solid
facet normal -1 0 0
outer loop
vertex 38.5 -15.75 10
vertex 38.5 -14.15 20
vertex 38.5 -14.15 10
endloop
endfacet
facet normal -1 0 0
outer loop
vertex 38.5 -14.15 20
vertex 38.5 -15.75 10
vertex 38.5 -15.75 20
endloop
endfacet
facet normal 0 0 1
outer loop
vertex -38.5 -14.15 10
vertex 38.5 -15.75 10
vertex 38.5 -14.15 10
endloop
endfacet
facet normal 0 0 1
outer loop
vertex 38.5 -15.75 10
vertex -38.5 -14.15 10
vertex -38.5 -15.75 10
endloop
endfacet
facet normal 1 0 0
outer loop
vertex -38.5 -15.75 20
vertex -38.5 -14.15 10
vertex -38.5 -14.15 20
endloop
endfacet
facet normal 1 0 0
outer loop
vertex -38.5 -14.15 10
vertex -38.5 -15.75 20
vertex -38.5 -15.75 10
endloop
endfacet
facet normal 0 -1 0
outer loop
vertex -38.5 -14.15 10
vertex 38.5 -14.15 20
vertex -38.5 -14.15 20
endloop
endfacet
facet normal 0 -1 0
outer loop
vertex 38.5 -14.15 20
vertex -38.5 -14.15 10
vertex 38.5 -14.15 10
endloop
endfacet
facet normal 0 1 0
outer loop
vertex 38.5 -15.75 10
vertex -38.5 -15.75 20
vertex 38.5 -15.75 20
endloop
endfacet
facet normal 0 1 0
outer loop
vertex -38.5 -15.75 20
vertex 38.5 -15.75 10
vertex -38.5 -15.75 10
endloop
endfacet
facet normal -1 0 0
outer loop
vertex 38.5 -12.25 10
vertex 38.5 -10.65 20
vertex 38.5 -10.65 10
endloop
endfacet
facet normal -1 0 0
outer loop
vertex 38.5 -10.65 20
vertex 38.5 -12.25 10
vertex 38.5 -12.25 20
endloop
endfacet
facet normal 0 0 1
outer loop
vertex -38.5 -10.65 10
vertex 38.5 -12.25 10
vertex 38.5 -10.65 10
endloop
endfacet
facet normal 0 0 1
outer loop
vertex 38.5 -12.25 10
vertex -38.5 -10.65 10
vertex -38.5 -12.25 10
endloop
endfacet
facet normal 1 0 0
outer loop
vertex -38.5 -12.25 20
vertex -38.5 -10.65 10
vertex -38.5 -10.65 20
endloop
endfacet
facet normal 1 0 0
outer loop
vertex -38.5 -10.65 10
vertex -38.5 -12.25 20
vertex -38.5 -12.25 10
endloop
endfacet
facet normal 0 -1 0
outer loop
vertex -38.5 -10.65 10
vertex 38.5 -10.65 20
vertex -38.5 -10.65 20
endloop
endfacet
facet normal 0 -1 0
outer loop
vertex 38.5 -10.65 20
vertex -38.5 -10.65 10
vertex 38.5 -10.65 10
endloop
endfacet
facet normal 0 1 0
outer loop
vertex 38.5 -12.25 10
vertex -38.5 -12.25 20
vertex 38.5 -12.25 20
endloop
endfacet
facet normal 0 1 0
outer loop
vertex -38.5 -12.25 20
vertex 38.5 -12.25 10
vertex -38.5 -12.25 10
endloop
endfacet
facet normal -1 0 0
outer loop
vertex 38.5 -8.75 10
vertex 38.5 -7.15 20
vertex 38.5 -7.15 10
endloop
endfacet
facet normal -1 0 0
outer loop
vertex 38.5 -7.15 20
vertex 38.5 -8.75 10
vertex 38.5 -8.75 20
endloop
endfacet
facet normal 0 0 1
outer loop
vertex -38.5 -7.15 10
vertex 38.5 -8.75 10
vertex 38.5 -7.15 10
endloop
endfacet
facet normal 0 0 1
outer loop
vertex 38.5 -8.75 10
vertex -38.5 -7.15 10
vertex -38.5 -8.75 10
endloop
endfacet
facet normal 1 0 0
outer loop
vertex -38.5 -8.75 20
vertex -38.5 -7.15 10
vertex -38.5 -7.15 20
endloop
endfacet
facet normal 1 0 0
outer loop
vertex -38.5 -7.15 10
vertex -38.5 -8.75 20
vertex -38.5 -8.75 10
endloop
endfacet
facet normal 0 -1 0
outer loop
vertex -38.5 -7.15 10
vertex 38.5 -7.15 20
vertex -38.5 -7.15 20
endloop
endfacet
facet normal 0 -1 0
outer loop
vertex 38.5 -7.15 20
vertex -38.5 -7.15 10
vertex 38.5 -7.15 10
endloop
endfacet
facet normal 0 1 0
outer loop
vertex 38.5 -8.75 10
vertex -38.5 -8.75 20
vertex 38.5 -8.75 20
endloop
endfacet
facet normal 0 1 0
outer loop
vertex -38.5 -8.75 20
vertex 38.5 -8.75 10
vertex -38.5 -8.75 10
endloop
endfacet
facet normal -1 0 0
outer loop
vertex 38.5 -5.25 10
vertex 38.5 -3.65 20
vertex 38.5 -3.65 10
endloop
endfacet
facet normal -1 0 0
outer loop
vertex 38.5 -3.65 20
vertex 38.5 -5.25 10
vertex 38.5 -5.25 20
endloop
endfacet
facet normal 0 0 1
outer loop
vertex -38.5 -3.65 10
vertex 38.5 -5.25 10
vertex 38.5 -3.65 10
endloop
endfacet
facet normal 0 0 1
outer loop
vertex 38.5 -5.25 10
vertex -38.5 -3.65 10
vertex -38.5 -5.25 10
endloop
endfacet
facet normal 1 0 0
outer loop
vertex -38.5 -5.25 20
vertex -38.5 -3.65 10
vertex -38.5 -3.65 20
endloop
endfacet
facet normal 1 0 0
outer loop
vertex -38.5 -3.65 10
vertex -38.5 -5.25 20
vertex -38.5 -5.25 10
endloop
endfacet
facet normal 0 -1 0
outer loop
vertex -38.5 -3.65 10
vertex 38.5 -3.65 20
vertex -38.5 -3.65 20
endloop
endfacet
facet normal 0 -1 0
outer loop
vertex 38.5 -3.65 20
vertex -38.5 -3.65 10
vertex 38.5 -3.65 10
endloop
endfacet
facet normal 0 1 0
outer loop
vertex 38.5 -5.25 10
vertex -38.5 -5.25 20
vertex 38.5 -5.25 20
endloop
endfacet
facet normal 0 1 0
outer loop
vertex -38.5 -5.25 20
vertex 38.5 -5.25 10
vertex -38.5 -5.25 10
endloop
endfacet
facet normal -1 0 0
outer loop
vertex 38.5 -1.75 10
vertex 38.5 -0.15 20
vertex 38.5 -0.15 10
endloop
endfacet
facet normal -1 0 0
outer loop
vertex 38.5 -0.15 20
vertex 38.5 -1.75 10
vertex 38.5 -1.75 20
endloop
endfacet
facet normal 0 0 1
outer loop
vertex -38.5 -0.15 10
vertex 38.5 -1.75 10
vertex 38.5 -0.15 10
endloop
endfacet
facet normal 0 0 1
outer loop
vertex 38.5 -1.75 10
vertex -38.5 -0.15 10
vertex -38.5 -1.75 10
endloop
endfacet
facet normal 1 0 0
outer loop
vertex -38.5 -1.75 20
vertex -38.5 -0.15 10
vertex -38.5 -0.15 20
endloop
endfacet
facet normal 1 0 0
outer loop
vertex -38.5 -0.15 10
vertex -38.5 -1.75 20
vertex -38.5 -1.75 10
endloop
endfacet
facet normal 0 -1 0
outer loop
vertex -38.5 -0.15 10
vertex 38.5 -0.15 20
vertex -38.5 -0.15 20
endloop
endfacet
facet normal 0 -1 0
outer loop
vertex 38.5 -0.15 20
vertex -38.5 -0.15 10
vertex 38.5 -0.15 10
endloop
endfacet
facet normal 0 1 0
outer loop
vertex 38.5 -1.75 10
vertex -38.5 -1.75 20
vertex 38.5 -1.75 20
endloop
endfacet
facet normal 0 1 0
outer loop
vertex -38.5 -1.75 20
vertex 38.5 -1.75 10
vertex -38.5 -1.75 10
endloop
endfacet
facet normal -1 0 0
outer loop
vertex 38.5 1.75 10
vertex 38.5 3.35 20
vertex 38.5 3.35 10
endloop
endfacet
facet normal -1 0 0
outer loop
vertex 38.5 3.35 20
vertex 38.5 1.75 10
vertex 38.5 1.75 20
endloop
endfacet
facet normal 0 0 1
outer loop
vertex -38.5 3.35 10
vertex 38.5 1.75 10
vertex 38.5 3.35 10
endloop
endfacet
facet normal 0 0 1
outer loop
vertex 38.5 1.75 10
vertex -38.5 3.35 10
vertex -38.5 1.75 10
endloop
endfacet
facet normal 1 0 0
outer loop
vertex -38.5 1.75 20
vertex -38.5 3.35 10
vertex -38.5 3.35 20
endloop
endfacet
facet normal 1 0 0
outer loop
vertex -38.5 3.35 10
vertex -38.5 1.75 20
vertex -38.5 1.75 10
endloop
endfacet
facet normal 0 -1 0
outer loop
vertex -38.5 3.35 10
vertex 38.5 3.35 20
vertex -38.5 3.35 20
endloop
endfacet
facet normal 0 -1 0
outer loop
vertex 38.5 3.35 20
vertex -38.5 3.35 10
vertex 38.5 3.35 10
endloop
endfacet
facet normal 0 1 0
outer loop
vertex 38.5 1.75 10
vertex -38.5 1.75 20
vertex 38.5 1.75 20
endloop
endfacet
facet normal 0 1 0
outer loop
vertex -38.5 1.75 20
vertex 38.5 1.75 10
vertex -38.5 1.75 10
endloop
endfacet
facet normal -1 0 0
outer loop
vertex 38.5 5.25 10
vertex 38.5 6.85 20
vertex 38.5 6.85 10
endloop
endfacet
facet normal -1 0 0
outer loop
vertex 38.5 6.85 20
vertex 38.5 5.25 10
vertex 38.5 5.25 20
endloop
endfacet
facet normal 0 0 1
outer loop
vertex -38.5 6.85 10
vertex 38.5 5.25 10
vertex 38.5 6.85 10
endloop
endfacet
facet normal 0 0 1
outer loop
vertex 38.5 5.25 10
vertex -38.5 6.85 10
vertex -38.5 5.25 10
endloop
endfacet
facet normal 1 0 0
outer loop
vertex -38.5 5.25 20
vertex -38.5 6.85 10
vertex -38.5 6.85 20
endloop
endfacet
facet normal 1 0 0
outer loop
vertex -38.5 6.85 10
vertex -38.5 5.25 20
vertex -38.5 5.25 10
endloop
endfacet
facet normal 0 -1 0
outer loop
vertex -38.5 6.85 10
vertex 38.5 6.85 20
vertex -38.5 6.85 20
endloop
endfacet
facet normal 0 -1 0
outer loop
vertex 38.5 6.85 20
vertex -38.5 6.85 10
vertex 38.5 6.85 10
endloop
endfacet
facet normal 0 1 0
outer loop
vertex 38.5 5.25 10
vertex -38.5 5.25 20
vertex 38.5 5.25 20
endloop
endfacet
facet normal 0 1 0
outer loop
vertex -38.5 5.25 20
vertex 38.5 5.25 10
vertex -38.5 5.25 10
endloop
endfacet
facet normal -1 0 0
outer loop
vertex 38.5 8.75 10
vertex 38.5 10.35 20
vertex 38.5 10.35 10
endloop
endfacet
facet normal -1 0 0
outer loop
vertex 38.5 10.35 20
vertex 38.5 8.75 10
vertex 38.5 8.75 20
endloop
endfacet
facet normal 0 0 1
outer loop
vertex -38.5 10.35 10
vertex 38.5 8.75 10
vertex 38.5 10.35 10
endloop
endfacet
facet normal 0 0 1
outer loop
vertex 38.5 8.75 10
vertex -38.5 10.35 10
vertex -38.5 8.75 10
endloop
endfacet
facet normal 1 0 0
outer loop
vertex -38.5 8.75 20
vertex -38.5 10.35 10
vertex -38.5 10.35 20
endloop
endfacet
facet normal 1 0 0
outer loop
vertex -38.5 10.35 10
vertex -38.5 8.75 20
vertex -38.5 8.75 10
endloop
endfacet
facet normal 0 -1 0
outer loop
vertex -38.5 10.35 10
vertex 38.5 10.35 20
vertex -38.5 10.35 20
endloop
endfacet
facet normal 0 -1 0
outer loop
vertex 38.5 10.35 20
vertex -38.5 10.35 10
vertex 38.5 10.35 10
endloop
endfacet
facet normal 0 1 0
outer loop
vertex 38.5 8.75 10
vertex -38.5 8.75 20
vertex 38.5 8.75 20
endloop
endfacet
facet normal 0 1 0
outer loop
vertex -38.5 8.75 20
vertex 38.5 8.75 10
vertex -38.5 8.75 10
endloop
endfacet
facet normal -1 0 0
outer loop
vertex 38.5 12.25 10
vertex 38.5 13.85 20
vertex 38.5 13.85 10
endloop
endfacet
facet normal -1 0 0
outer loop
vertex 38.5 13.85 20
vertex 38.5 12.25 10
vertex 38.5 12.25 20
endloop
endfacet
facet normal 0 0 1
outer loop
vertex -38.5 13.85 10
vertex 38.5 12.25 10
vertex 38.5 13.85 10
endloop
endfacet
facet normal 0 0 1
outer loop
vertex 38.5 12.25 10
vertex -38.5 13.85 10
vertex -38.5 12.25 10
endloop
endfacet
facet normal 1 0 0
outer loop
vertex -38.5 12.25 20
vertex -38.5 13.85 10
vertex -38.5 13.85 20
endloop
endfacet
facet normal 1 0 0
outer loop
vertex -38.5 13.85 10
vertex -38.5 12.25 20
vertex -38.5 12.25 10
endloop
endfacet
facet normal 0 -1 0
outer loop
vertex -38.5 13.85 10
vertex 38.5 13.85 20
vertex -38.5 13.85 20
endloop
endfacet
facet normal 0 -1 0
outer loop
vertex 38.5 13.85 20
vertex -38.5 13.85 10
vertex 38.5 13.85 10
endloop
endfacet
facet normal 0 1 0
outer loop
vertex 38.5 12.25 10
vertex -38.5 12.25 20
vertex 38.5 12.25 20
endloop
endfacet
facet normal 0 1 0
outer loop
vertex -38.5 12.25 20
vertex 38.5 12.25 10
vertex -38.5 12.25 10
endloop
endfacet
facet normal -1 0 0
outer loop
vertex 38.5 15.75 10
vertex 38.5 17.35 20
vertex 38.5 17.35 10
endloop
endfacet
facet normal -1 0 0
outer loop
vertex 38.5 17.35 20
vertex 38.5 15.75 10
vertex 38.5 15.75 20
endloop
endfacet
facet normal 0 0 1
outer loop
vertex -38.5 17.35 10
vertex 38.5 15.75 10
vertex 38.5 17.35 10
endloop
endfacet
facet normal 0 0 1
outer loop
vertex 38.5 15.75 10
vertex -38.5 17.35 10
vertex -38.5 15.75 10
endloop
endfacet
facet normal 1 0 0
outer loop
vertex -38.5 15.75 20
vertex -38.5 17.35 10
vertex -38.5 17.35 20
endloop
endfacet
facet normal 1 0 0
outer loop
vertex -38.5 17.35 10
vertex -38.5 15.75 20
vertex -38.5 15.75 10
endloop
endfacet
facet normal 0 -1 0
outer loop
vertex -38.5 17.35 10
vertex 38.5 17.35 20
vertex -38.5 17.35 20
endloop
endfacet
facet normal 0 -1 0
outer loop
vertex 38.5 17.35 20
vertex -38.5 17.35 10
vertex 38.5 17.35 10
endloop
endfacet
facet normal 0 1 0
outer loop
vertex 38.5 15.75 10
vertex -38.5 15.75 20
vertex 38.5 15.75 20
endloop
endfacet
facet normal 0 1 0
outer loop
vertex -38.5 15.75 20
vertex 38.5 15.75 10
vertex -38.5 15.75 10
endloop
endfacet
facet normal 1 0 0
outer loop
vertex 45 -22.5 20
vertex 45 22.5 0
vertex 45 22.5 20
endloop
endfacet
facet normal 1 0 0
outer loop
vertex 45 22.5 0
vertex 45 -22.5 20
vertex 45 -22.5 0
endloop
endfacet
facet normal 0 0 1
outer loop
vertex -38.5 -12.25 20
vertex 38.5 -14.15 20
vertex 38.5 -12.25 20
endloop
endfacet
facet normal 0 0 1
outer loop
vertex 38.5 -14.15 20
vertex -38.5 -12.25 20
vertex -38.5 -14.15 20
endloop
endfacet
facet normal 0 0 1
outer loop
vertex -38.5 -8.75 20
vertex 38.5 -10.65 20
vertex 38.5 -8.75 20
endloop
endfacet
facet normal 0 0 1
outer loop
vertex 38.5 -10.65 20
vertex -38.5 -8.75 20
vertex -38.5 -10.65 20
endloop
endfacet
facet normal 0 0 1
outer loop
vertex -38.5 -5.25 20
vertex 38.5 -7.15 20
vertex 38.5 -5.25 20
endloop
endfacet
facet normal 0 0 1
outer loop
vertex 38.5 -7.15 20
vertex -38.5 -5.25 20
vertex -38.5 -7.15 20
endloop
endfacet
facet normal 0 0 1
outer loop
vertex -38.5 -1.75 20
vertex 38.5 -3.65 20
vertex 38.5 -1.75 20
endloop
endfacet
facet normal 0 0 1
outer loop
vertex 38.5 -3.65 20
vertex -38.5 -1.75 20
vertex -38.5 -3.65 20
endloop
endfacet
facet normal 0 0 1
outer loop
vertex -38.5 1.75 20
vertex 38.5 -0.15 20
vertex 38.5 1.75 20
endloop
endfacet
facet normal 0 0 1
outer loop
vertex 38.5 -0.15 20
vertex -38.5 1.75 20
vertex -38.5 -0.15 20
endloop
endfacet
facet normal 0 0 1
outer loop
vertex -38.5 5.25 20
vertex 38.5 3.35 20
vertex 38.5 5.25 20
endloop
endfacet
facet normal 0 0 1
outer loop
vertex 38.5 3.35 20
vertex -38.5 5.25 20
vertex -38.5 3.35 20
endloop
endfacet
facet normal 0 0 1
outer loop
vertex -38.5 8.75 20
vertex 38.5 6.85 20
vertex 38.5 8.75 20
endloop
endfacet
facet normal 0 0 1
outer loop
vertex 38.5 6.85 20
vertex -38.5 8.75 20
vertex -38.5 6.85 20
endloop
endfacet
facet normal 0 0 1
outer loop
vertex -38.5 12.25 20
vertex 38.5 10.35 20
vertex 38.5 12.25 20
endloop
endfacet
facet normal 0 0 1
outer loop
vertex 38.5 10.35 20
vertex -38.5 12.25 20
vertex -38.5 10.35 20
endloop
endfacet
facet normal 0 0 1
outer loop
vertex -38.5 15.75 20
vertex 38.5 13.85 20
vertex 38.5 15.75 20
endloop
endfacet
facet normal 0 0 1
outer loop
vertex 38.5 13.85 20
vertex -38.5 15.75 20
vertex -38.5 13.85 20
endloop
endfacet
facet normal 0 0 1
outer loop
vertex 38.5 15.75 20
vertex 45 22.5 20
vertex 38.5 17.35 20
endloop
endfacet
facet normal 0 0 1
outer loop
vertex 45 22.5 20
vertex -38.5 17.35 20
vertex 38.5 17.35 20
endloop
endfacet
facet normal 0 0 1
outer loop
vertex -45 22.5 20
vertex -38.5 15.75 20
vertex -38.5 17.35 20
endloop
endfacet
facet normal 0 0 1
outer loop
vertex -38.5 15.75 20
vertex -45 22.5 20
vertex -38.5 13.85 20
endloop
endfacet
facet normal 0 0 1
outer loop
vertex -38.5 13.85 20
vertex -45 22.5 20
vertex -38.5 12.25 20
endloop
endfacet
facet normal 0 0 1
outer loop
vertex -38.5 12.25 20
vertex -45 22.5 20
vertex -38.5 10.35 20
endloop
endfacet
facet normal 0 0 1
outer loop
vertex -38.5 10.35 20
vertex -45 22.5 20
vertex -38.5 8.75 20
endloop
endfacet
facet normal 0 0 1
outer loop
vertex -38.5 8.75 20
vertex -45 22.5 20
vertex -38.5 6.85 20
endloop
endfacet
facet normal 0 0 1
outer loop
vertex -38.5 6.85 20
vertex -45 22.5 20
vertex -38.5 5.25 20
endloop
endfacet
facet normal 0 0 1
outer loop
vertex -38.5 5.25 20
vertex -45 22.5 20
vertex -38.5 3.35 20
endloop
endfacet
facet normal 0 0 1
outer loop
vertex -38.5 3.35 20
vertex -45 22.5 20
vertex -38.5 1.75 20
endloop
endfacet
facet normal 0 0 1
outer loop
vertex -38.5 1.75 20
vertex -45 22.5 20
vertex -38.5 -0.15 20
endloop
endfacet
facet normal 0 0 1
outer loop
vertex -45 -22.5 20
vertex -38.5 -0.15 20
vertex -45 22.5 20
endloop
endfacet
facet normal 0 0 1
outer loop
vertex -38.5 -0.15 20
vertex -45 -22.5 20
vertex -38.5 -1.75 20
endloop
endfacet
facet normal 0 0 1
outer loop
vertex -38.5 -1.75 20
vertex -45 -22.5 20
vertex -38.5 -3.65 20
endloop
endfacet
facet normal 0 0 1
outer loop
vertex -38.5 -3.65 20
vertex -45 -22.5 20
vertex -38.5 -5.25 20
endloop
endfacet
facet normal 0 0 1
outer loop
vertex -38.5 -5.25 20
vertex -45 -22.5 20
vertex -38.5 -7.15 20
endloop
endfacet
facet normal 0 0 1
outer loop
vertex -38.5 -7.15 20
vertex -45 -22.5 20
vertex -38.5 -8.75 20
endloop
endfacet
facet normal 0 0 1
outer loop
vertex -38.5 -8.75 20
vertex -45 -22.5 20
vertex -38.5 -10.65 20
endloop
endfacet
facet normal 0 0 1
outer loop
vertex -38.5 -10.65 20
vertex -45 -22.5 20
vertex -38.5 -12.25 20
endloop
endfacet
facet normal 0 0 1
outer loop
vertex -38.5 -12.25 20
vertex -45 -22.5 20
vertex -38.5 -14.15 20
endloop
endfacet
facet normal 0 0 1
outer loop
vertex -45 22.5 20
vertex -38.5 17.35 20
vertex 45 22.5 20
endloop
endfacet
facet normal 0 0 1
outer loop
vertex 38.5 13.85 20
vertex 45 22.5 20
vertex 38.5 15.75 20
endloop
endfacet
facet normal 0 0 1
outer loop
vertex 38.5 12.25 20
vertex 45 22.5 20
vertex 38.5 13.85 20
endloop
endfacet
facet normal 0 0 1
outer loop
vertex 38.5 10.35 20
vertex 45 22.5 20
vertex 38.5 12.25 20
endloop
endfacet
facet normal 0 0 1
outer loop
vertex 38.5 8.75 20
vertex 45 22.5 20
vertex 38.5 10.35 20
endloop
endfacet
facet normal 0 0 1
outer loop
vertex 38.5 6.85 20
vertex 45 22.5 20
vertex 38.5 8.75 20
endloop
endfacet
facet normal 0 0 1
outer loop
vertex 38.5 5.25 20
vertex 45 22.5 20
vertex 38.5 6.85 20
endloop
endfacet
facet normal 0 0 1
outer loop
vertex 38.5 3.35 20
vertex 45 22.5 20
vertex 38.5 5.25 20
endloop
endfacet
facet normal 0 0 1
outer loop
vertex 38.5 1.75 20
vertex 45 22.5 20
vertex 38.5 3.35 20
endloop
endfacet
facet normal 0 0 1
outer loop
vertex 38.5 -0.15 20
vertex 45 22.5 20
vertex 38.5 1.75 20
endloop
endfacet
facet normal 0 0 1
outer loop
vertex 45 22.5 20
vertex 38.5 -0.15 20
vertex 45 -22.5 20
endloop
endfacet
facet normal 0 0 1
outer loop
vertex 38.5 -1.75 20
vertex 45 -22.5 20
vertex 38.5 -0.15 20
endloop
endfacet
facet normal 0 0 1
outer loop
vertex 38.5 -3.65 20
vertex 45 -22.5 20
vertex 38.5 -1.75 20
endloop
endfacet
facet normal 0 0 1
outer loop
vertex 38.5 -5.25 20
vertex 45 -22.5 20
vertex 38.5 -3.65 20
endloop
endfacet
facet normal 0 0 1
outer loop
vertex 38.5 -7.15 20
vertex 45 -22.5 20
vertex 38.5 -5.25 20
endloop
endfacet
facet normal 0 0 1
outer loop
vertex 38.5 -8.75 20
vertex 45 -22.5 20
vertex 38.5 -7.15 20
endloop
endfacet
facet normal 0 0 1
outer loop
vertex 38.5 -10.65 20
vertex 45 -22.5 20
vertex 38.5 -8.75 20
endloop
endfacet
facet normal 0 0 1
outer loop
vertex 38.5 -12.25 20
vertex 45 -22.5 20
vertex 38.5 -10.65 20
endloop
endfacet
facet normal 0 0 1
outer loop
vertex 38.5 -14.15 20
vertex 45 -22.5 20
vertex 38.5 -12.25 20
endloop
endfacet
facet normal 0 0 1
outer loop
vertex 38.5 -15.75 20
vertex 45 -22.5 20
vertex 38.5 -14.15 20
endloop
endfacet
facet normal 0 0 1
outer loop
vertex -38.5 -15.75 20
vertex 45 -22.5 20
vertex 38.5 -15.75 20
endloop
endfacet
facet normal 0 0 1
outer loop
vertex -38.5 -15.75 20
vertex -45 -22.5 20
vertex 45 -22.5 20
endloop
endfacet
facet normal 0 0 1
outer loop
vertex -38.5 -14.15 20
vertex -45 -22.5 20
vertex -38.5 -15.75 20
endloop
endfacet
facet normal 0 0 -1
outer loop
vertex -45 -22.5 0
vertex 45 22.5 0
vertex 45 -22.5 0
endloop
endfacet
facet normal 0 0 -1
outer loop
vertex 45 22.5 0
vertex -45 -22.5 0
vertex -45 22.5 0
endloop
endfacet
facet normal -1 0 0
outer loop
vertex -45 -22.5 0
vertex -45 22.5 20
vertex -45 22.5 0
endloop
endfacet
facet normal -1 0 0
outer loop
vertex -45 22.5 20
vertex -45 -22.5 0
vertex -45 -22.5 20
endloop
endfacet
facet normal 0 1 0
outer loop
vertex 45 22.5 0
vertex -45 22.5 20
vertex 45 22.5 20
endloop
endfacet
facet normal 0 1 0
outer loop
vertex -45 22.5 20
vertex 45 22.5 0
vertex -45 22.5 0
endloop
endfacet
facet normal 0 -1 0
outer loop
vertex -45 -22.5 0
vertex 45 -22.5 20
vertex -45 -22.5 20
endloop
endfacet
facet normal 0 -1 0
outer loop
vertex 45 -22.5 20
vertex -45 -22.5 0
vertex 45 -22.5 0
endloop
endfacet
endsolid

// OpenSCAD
// Microscope slide drying rack
// Print orientation: base block on XY plane, slots open upward (+Z)

// ---------------- Parameters ----------------
block_len   = 90;    // block length along X (mm)
block_wid   = 45;    // block width along Y (mm)
block_ht    = 20;    // block height along Z (mm)

slot_count  = 10;    // number of slide slots
slot_len    = 77;    // slot length along X (mm)
slot_wid    = 1.6;   // slot width along Y (mm)
slot_depth  = 10;    // slot depth from top face (mm)
slot_pitch  = 3.5;   // centre-to-centre slot spacing along Y (mm)

eps         = 0.5;   // overshoot so cutters pass through the top face (mm)

$fn = 64;

// ---------------- Model ----------------
difference() {
    // Main block, centred in X/Y, resting on z = 0
    translate([-block_len/2, -block_wid/2, 0])
        cube([block_len, block_wid, block_ht]);

    // Slot group, centred on the block in X and Y
    for (i = [0 : slot_count - 1]) {
        y = (i - (slot_count - 1)/2) * slot_pitch;
        translate([-slot_len/2, y, block_ht - slot_depth])
            cube([slot_len, slot_wid, slot_depth + eps]);
    }
}
